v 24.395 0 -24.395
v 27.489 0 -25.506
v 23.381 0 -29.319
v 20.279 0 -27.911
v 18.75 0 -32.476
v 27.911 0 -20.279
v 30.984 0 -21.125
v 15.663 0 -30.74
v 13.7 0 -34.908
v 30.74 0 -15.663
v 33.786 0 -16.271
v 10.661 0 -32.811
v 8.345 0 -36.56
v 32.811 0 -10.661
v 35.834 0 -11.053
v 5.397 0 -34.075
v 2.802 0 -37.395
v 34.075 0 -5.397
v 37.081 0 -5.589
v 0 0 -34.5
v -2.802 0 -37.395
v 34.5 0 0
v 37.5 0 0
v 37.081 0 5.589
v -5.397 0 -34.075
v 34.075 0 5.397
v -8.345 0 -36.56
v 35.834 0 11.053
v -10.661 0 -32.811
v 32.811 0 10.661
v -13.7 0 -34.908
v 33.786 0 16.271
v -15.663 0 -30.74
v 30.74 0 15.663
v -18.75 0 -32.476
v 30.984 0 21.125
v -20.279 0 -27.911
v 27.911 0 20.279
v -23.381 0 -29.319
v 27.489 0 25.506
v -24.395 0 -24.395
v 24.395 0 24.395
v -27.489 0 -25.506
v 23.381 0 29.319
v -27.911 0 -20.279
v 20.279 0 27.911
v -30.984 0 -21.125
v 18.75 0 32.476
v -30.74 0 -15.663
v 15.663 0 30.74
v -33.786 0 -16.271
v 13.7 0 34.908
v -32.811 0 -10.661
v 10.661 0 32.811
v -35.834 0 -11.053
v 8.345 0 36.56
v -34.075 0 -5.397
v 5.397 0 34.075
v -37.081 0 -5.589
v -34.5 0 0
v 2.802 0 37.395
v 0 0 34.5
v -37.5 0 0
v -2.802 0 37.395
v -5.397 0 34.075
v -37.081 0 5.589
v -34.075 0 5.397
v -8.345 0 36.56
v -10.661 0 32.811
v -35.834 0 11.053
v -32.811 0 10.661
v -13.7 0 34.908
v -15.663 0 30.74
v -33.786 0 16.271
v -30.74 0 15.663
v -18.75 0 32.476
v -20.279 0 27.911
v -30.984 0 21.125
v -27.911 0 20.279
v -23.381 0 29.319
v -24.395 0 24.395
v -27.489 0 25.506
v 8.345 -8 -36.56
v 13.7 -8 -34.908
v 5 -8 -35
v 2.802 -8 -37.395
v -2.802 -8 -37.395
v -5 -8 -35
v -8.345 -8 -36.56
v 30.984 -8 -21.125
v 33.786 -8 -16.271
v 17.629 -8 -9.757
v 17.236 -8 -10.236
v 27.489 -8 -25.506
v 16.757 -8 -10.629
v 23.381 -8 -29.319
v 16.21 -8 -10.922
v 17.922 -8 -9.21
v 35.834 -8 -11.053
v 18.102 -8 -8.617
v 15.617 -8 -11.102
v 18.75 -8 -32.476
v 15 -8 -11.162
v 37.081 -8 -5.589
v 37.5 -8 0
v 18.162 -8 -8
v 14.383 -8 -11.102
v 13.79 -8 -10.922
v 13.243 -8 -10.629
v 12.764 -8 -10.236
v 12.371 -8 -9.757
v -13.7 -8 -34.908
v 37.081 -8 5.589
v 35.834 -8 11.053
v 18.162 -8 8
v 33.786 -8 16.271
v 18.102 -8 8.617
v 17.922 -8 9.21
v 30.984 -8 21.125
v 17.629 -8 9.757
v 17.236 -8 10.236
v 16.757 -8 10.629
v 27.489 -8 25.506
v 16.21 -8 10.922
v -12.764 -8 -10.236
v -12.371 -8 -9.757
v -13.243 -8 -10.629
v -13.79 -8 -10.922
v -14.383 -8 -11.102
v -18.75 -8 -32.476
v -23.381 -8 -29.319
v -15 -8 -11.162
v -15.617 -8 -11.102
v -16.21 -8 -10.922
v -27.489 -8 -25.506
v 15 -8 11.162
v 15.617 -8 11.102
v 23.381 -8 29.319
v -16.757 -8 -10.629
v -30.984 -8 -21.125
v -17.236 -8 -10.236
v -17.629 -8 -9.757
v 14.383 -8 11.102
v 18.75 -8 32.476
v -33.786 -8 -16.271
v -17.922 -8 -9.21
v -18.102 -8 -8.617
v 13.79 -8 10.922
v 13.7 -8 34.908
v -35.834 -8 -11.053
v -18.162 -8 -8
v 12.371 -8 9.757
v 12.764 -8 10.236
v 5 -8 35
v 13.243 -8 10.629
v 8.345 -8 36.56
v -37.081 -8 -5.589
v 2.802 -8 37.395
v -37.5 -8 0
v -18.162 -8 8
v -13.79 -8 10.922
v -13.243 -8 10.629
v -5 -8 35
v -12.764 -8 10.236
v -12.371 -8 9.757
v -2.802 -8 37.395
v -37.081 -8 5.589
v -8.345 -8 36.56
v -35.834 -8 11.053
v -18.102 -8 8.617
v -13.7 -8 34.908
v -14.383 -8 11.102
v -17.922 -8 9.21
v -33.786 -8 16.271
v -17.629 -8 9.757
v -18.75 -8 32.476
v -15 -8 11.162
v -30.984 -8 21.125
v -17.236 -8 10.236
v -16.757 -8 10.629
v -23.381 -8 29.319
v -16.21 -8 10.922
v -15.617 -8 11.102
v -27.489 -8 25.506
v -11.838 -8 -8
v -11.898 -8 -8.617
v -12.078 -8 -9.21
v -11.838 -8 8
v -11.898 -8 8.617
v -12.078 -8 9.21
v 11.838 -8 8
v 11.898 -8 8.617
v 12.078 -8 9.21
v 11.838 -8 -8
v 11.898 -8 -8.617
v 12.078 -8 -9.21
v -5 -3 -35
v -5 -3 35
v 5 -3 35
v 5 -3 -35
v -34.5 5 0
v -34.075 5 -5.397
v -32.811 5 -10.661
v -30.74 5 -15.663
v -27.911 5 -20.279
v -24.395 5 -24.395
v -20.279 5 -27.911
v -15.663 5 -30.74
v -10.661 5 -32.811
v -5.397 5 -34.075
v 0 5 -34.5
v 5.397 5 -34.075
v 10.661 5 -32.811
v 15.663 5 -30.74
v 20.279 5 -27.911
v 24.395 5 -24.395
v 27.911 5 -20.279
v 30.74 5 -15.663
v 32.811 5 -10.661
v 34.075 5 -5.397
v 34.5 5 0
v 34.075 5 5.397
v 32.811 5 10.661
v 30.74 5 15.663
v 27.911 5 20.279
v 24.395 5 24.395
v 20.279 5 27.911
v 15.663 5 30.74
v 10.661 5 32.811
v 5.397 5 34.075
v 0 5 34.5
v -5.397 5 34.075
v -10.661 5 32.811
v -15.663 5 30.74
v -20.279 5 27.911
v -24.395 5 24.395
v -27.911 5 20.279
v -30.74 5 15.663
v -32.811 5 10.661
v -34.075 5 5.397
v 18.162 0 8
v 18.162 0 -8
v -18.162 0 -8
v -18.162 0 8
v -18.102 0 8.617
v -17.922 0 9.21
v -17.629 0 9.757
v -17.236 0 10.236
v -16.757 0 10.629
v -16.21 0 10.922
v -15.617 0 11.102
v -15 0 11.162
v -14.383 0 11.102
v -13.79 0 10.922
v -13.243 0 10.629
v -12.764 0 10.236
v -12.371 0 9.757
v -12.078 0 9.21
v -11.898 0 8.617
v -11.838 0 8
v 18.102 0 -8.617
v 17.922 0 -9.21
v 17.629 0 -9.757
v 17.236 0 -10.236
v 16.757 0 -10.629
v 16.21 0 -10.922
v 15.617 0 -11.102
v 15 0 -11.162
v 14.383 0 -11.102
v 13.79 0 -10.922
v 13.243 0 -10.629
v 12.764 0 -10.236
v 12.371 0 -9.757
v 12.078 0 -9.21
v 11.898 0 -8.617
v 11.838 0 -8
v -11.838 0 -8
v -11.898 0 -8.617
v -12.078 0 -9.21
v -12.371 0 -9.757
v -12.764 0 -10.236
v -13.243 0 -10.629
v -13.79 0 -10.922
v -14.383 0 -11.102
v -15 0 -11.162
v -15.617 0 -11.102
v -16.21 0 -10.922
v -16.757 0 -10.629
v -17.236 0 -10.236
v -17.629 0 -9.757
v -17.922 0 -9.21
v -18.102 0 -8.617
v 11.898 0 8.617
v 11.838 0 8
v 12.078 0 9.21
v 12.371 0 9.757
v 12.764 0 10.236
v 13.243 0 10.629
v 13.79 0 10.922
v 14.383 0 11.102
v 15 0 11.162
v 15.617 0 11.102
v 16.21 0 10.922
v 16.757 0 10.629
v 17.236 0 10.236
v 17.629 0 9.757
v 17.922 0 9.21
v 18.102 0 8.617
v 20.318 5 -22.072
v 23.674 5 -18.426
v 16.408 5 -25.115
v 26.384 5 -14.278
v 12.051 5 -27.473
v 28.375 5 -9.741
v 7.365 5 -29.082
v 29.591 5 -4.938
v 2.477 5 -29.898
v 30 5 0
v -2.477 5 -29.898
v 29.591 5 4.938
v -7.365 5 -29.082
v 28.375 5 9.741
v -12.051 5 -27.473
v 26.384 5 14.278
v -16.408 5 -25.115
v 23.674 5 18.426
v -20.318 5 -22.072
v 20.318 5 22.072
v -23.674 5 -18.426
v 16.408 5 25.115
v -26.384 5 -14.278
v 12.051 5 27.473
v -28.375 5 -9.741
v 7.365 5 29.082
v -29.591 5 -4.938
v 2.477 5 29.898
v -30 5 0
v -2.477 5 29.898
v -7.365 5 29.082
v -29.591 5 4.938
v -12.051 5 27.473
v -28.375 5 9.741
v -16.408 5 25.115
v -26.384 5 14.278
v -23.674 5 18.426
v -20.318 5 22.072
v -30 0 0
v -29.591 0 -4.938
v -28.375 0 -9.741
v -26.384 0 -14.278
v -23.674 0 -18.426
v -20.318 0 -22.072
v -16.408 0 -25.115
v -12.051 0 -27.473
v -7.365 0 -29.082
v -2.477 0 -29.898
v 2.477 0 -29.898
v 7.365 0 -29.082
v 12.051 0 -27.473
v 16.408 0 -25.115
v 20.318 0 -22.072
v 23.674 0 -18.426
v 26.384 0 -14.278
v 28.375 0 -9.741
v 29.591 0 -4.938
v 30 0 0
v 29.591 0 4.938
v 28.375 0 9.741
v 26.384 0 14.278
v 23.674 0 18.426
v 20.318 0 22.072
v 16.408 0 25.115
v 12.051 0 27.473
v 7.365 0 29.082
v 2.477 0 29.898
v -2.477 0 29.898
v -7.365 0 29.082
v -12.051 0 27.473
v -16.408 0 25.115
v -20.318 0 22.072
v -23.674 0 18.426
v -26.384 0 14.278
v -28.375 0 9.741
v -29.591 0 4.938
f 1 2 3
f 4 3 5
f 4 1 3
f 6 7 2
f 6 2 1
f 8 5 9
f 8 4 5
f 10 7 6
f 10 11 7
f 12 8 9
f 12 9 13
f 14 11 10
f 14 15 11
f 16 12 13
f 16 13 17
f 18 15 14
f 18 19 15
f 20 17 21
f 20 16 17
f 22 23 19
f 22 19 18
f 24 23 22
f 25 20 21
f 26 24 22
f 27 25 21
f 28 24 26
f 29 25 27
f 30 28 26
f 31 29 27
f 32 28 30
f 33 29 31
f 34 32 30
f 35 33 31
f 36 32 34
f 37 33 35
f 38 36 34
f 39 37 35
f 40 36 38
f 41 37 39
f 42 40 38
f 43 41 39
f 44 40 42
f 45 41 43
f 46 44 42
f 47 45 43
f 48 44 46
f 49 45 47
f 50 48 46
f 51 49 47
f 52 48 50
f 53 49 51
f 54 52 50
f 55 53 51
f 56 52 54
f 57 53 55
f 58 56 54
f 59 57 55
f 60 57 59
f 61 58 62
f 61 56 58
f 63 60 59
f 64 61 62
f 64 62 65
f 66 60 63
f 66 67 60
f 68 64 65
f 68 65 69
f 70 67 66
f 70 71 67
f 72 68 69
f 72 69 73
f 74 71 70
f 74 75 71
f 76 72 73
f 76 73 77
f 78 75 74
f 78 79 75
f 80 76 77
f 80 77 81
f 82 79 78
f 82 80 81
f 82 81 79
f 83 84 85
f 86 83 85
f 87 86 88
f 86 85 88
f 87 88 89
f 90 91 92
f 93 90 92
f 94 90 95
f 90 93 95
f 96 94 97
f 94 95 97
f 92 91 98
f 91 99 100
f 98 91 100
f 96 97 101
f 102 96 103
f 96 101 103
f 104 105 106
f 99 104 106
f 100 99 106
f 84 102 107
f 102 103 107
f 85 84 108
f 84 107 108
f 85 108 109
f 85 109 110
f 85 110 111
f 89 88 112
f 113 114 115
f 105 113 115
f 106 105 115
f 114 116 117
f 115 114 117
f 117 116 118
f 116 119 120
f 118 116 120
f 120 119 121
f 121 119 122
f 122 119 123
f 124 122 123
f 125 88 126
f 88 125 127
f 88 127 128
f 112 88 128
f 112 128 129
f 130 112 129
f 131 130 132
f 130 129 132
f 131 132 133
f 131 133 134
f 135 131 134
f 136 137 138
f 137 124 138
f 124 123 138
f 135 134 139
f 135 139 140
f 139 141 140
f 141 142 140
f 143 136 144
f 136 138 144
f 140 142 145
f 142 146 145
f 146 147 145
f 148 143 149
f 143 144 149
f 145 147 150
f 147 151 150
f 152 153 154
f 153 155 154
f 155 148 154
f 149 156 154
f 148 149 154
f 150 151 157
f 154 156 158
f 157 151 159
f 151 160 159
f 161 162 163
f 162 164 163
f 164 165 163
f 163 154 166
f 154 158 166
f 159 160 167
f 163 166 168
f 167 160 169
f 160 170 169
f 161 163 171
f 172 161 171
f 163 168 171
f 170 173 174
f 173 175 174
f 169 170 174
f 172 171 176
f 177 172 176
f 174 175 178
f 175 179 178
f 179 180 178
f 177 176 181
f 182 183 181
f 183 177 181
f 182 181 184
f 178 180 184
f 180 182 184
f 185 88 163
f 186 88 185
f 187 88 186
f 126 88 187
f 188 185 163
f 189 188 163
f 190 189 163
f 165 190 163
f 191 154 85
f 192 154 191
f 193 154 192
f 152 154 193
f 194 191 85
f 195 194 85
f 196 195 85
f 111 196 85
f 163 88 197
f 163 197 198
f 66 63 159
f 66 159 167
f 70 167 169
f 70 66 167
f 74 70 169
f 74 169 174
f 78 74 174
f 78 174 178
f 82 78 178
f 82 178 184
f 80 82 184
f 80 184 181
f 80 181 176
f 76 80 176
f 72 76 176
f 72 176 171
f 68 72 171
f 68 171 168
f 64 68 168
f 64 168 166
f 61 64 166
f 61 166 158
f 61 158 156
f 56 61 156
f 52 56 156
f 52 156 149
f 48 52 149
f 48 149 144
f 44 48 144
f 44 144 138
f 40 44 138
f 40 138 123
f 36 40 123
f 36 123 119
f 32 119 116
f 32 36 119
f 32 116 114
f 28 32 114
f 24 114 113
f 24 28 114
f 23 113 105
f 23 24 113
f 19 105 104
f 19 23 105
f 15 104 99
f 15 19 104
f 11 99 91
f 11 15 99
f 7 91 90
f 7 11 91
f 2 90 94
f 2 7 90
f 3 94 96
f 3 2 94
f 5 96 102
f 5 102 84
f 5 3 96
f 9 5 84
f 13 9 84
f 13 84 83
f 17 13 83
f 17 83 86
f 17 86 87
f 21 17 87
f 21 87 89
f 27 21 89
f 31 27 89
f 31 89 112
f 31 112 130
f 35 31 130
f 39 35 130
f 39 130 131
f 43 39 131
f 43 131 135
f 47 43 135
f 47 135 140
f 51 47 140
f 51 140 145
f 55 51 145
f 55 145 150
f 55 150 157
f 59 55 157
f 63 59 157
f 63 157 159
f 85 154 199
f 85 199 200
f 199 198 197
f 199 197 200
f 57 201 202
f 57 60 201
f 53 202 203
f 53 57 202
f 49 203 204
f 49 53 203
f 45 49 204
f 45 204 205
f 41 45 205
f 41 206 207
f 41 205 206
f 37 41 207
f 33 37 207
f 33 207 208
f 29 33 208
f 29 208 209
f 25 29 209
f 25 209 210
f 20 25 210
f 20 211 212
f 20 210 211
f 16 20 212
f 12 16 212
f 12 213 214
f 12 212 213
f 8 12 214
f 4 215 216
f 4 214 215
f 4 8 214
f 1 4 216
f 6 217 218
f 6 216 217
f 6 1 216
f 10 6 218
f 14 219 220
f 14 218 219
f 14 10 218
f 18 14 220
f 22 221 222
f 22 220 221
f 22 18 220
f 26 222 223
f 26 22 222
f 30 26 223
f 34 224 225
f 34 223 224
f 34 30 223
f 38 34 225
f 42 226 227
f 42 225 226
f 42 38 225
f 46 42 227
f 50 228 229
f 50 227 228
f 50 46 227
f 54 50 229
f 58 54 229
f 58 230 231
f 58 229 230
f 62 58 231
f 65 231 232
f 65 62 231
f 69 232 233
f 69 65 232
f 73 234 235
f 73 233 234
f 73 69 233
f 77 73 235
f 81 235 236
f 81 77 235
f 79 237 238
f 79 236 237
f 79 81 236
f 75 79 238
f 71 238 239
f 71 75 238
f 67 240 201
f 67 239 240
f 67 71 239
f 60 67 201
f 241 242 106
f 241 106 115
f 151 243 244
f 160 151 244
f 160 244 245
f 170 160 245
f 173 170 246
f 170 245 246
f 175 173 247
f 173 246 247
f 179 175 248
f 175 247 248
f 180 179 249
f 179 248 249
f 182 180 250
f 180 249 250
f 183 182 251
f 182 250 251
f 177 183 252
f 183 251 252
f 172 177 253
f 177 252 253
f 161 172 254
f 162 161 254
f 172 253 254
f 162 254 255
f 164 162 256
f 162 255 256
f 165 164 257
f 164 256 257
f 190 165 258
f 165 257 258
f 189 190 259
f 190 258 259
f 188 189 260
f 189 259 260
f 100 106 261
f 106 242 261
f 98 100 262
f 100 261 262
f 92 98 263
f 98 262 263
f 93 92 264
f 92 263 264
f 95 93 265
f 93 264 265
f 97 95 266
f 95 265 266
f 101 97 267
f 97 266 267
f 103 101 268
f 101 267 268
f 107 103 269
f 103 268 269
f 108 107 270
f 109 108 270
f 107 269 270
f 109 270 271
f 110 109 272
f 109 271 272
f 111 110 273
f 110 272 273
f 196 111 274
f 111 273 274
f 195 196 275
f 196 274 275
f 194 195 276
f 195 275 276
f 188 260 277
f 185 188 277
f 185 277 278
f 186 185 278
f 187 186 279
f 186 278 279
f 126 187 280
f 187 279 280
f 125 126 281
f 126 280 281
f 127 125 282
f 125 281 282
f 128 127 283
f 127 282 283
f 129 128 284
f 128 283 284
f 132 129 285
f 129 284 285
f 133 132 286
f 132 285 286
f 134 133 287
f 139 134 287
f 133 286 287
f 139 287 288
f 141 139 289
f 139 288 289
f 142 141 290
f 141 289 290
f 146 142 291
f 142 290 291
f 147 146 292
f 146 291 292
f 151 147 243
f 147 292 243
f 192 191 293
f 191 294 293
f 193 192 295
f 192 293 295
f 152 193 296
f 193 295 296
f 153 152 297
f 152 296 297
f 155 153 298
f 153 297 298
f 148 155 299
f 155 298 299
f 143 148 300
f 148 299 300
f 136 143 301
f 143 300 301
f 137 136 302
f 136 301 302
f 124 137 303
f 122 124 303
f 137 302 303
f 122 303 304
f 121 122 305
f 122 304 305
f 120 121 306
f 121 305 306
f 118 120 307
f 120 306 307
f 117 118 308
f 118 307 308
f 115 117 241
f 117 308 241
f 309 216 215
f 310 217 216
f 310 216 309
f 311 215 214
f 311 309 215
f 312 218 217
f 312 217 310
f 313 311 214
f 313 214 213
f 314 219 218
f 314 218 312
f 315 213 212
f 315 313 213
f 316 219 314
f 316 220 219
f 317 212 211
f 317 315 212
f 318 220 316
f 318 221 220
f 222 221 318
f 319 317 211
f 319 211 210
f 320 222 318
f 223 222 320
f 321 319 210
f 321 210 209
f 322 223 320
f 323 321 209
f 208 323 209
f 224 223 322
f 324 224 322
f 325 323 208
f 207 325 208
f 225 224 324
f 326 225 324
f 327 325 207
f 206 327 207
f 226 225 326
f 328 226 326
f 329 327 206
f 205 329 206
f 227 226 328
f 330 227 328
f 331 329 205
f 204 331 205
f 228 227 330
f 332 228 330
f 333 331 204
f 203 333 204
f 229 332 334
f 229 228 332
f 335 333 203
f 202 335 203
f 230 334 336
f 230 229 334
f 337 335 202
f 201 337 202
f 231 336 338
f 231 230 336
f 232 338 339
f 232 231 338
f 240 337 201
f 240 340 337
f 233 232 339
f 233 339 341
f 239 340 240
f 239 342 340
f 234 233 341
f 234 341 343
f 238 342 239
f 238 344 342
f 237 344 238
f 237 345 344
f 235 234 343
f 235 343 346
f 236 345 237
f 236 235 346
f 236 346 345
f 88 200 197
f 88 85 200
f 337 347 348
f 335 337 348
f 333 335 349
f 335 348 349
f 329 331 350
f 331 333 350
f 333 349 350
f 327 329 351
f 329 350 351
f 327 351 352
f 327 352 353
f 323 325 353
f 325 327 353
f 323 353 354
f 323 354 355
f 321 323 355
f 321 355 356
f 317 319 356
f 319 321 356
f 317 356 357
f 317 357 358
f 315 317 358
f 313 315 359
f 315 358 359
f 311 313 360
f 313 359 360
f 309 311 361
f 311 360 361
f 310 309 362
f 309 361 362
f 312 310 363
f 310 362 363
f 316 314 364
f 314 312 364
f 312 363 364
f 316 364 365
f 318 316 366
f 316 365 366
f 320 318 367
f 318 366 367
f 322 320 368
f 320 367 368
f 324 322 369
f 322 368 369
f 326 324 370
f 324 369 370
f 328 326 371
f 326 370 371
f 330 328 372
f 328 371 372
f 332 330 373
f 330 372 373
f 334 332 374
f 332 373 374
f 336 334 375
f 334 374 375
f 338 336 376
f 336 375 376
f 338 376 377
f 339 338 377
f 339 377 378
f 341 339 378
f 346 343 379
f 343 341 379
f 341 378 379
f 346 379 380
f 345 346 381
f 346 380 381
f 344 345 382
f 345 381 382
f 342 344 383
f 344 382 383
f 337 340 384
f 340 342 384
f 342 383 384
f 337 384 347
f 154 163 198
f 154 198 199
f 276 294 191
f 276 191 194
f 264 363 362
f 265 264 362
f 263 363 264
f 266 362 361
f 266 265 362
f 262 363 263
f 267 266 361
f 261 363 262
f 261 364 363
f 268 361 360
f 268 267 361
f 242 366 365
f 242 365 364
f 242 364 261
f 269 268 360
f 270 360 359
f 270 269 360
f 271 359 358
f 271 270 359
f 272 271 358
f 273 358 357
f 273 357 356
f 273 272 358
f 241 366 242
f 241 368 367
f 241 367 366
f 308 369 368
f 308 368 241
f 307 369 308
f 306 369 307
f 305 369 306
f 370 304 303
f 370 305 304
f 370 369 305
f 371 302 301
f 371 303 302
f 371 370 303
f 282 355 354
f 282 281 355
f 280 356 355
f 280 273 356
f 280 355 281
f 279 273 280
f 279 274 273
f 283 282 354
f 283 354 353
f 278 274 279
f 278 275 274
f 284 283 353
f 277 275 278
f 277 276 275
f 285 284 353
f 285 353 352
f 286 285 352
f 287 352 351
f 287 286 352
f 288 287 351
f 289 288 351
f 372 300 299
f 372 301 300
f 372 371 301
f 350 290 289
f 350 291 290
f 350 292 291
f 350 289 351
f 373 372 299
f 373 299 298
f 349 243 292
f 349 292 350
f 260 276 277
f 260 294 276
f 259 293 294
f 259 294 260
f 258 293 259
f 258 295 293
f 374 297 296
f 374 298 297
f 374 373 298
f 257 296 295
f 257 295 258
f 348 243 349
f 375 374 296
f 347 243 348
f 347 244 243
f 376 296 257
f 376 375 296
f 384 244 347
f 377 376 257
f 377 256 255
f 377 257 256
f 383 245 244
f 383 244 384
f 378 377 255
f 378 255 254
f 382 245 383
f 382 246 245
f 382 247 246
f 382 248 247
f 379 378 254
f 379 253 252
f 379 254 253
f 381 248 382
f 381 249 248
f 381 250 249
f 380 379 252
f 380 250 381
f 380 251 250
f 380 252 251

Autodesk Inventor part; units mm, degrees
ref_plane "YZ Plane" through (0, 0, 0) normal (1, 0, 0) x (0, 1, 0)
ref_plane "XZ Plane" through (0, 0, 0) normal (0, 1, 0) x (-1, 0, 0)
ref_plane "XY Plane" through (0, 0, 0) normal (0, 0, 1) x (1, 0, 0)
sketch "Sketch1" plane through (0, 0, 0) normal (0, 1, 0) x (-1, 0, 0)
  circle A0 centre (0, 0) radius 34.5
  circle A1 centre (0, 0) radius 37.5
  circle A2 centre (0, 0) radius 30
  line L0 (15, 8) -> (15, -8) construction
  line L1 (11.8377, 8) -> (11.8377, -8)
  line L2 (18.1623, -8) -> (18.1623, 8)
  arc A3 (18.1623, 8) -> (11.8377, 8) centre (15, 8) ccw
  arc A4 (11.8377, -8) -> (18.1623, -8) centre (15, -8) ccw
  line L3 (0, 16.7478) -> (0, 6) construction
  line L4 (-11.8377, 8) -> (-11.8377, -8)
  line L5 (-18.1623, -8) -> (-18.1623, 8)
  arc A5 (-11.8377, 8) -> (-18.1623, 8) centre (-15, 8) ccw
  arc A6 (-18.1623, -8) -> (-11.8377, -8) centre (-15, -8) ccw
  point P0 (15, 0)
  dimension "d0" = 69
  dimension "d1" = 75
  dimension "d2" = 60
  dimension "d3" = 15
  dimension "d4" = 16
  dimension "d5" = 8
  dimension "d6" = 3.1623
  dimension "d7" = 6
  dimension "d8" = 15
  dimension "d9" = 16.7478
extrude "Extrusion1" add sketch "Sketch1" against normal blind 8 contours A0 | A1 | A2
extrude "Extrusion2" add sketch "Sketch1" along normal blind 5 contours A0
sketch "Sketch2" plane through (0, -8, 0) normal (0, -1, 0) x (1, 0, 0)
  line L0 (-5, 35) -> (5, 35)
  line L1 (5, 35) -> (5, -35)
  line L2 (5, -35) -> (-5, -35)
  line L3 (-5, -35) -> (-5, 35)
  line L4 (-5, 35) -> (5, -35) construction
  line L5 (5, 35) -> (-5, -35) construction
  point P0 (0, 0)
  point P1 (0, 35)
  dimension "d16" = 10
  dimension "d17" = 70
extrude "Extrusion3" cut sketch "Sketch2" against normal blind 5
properties part number "bay_bottom"
